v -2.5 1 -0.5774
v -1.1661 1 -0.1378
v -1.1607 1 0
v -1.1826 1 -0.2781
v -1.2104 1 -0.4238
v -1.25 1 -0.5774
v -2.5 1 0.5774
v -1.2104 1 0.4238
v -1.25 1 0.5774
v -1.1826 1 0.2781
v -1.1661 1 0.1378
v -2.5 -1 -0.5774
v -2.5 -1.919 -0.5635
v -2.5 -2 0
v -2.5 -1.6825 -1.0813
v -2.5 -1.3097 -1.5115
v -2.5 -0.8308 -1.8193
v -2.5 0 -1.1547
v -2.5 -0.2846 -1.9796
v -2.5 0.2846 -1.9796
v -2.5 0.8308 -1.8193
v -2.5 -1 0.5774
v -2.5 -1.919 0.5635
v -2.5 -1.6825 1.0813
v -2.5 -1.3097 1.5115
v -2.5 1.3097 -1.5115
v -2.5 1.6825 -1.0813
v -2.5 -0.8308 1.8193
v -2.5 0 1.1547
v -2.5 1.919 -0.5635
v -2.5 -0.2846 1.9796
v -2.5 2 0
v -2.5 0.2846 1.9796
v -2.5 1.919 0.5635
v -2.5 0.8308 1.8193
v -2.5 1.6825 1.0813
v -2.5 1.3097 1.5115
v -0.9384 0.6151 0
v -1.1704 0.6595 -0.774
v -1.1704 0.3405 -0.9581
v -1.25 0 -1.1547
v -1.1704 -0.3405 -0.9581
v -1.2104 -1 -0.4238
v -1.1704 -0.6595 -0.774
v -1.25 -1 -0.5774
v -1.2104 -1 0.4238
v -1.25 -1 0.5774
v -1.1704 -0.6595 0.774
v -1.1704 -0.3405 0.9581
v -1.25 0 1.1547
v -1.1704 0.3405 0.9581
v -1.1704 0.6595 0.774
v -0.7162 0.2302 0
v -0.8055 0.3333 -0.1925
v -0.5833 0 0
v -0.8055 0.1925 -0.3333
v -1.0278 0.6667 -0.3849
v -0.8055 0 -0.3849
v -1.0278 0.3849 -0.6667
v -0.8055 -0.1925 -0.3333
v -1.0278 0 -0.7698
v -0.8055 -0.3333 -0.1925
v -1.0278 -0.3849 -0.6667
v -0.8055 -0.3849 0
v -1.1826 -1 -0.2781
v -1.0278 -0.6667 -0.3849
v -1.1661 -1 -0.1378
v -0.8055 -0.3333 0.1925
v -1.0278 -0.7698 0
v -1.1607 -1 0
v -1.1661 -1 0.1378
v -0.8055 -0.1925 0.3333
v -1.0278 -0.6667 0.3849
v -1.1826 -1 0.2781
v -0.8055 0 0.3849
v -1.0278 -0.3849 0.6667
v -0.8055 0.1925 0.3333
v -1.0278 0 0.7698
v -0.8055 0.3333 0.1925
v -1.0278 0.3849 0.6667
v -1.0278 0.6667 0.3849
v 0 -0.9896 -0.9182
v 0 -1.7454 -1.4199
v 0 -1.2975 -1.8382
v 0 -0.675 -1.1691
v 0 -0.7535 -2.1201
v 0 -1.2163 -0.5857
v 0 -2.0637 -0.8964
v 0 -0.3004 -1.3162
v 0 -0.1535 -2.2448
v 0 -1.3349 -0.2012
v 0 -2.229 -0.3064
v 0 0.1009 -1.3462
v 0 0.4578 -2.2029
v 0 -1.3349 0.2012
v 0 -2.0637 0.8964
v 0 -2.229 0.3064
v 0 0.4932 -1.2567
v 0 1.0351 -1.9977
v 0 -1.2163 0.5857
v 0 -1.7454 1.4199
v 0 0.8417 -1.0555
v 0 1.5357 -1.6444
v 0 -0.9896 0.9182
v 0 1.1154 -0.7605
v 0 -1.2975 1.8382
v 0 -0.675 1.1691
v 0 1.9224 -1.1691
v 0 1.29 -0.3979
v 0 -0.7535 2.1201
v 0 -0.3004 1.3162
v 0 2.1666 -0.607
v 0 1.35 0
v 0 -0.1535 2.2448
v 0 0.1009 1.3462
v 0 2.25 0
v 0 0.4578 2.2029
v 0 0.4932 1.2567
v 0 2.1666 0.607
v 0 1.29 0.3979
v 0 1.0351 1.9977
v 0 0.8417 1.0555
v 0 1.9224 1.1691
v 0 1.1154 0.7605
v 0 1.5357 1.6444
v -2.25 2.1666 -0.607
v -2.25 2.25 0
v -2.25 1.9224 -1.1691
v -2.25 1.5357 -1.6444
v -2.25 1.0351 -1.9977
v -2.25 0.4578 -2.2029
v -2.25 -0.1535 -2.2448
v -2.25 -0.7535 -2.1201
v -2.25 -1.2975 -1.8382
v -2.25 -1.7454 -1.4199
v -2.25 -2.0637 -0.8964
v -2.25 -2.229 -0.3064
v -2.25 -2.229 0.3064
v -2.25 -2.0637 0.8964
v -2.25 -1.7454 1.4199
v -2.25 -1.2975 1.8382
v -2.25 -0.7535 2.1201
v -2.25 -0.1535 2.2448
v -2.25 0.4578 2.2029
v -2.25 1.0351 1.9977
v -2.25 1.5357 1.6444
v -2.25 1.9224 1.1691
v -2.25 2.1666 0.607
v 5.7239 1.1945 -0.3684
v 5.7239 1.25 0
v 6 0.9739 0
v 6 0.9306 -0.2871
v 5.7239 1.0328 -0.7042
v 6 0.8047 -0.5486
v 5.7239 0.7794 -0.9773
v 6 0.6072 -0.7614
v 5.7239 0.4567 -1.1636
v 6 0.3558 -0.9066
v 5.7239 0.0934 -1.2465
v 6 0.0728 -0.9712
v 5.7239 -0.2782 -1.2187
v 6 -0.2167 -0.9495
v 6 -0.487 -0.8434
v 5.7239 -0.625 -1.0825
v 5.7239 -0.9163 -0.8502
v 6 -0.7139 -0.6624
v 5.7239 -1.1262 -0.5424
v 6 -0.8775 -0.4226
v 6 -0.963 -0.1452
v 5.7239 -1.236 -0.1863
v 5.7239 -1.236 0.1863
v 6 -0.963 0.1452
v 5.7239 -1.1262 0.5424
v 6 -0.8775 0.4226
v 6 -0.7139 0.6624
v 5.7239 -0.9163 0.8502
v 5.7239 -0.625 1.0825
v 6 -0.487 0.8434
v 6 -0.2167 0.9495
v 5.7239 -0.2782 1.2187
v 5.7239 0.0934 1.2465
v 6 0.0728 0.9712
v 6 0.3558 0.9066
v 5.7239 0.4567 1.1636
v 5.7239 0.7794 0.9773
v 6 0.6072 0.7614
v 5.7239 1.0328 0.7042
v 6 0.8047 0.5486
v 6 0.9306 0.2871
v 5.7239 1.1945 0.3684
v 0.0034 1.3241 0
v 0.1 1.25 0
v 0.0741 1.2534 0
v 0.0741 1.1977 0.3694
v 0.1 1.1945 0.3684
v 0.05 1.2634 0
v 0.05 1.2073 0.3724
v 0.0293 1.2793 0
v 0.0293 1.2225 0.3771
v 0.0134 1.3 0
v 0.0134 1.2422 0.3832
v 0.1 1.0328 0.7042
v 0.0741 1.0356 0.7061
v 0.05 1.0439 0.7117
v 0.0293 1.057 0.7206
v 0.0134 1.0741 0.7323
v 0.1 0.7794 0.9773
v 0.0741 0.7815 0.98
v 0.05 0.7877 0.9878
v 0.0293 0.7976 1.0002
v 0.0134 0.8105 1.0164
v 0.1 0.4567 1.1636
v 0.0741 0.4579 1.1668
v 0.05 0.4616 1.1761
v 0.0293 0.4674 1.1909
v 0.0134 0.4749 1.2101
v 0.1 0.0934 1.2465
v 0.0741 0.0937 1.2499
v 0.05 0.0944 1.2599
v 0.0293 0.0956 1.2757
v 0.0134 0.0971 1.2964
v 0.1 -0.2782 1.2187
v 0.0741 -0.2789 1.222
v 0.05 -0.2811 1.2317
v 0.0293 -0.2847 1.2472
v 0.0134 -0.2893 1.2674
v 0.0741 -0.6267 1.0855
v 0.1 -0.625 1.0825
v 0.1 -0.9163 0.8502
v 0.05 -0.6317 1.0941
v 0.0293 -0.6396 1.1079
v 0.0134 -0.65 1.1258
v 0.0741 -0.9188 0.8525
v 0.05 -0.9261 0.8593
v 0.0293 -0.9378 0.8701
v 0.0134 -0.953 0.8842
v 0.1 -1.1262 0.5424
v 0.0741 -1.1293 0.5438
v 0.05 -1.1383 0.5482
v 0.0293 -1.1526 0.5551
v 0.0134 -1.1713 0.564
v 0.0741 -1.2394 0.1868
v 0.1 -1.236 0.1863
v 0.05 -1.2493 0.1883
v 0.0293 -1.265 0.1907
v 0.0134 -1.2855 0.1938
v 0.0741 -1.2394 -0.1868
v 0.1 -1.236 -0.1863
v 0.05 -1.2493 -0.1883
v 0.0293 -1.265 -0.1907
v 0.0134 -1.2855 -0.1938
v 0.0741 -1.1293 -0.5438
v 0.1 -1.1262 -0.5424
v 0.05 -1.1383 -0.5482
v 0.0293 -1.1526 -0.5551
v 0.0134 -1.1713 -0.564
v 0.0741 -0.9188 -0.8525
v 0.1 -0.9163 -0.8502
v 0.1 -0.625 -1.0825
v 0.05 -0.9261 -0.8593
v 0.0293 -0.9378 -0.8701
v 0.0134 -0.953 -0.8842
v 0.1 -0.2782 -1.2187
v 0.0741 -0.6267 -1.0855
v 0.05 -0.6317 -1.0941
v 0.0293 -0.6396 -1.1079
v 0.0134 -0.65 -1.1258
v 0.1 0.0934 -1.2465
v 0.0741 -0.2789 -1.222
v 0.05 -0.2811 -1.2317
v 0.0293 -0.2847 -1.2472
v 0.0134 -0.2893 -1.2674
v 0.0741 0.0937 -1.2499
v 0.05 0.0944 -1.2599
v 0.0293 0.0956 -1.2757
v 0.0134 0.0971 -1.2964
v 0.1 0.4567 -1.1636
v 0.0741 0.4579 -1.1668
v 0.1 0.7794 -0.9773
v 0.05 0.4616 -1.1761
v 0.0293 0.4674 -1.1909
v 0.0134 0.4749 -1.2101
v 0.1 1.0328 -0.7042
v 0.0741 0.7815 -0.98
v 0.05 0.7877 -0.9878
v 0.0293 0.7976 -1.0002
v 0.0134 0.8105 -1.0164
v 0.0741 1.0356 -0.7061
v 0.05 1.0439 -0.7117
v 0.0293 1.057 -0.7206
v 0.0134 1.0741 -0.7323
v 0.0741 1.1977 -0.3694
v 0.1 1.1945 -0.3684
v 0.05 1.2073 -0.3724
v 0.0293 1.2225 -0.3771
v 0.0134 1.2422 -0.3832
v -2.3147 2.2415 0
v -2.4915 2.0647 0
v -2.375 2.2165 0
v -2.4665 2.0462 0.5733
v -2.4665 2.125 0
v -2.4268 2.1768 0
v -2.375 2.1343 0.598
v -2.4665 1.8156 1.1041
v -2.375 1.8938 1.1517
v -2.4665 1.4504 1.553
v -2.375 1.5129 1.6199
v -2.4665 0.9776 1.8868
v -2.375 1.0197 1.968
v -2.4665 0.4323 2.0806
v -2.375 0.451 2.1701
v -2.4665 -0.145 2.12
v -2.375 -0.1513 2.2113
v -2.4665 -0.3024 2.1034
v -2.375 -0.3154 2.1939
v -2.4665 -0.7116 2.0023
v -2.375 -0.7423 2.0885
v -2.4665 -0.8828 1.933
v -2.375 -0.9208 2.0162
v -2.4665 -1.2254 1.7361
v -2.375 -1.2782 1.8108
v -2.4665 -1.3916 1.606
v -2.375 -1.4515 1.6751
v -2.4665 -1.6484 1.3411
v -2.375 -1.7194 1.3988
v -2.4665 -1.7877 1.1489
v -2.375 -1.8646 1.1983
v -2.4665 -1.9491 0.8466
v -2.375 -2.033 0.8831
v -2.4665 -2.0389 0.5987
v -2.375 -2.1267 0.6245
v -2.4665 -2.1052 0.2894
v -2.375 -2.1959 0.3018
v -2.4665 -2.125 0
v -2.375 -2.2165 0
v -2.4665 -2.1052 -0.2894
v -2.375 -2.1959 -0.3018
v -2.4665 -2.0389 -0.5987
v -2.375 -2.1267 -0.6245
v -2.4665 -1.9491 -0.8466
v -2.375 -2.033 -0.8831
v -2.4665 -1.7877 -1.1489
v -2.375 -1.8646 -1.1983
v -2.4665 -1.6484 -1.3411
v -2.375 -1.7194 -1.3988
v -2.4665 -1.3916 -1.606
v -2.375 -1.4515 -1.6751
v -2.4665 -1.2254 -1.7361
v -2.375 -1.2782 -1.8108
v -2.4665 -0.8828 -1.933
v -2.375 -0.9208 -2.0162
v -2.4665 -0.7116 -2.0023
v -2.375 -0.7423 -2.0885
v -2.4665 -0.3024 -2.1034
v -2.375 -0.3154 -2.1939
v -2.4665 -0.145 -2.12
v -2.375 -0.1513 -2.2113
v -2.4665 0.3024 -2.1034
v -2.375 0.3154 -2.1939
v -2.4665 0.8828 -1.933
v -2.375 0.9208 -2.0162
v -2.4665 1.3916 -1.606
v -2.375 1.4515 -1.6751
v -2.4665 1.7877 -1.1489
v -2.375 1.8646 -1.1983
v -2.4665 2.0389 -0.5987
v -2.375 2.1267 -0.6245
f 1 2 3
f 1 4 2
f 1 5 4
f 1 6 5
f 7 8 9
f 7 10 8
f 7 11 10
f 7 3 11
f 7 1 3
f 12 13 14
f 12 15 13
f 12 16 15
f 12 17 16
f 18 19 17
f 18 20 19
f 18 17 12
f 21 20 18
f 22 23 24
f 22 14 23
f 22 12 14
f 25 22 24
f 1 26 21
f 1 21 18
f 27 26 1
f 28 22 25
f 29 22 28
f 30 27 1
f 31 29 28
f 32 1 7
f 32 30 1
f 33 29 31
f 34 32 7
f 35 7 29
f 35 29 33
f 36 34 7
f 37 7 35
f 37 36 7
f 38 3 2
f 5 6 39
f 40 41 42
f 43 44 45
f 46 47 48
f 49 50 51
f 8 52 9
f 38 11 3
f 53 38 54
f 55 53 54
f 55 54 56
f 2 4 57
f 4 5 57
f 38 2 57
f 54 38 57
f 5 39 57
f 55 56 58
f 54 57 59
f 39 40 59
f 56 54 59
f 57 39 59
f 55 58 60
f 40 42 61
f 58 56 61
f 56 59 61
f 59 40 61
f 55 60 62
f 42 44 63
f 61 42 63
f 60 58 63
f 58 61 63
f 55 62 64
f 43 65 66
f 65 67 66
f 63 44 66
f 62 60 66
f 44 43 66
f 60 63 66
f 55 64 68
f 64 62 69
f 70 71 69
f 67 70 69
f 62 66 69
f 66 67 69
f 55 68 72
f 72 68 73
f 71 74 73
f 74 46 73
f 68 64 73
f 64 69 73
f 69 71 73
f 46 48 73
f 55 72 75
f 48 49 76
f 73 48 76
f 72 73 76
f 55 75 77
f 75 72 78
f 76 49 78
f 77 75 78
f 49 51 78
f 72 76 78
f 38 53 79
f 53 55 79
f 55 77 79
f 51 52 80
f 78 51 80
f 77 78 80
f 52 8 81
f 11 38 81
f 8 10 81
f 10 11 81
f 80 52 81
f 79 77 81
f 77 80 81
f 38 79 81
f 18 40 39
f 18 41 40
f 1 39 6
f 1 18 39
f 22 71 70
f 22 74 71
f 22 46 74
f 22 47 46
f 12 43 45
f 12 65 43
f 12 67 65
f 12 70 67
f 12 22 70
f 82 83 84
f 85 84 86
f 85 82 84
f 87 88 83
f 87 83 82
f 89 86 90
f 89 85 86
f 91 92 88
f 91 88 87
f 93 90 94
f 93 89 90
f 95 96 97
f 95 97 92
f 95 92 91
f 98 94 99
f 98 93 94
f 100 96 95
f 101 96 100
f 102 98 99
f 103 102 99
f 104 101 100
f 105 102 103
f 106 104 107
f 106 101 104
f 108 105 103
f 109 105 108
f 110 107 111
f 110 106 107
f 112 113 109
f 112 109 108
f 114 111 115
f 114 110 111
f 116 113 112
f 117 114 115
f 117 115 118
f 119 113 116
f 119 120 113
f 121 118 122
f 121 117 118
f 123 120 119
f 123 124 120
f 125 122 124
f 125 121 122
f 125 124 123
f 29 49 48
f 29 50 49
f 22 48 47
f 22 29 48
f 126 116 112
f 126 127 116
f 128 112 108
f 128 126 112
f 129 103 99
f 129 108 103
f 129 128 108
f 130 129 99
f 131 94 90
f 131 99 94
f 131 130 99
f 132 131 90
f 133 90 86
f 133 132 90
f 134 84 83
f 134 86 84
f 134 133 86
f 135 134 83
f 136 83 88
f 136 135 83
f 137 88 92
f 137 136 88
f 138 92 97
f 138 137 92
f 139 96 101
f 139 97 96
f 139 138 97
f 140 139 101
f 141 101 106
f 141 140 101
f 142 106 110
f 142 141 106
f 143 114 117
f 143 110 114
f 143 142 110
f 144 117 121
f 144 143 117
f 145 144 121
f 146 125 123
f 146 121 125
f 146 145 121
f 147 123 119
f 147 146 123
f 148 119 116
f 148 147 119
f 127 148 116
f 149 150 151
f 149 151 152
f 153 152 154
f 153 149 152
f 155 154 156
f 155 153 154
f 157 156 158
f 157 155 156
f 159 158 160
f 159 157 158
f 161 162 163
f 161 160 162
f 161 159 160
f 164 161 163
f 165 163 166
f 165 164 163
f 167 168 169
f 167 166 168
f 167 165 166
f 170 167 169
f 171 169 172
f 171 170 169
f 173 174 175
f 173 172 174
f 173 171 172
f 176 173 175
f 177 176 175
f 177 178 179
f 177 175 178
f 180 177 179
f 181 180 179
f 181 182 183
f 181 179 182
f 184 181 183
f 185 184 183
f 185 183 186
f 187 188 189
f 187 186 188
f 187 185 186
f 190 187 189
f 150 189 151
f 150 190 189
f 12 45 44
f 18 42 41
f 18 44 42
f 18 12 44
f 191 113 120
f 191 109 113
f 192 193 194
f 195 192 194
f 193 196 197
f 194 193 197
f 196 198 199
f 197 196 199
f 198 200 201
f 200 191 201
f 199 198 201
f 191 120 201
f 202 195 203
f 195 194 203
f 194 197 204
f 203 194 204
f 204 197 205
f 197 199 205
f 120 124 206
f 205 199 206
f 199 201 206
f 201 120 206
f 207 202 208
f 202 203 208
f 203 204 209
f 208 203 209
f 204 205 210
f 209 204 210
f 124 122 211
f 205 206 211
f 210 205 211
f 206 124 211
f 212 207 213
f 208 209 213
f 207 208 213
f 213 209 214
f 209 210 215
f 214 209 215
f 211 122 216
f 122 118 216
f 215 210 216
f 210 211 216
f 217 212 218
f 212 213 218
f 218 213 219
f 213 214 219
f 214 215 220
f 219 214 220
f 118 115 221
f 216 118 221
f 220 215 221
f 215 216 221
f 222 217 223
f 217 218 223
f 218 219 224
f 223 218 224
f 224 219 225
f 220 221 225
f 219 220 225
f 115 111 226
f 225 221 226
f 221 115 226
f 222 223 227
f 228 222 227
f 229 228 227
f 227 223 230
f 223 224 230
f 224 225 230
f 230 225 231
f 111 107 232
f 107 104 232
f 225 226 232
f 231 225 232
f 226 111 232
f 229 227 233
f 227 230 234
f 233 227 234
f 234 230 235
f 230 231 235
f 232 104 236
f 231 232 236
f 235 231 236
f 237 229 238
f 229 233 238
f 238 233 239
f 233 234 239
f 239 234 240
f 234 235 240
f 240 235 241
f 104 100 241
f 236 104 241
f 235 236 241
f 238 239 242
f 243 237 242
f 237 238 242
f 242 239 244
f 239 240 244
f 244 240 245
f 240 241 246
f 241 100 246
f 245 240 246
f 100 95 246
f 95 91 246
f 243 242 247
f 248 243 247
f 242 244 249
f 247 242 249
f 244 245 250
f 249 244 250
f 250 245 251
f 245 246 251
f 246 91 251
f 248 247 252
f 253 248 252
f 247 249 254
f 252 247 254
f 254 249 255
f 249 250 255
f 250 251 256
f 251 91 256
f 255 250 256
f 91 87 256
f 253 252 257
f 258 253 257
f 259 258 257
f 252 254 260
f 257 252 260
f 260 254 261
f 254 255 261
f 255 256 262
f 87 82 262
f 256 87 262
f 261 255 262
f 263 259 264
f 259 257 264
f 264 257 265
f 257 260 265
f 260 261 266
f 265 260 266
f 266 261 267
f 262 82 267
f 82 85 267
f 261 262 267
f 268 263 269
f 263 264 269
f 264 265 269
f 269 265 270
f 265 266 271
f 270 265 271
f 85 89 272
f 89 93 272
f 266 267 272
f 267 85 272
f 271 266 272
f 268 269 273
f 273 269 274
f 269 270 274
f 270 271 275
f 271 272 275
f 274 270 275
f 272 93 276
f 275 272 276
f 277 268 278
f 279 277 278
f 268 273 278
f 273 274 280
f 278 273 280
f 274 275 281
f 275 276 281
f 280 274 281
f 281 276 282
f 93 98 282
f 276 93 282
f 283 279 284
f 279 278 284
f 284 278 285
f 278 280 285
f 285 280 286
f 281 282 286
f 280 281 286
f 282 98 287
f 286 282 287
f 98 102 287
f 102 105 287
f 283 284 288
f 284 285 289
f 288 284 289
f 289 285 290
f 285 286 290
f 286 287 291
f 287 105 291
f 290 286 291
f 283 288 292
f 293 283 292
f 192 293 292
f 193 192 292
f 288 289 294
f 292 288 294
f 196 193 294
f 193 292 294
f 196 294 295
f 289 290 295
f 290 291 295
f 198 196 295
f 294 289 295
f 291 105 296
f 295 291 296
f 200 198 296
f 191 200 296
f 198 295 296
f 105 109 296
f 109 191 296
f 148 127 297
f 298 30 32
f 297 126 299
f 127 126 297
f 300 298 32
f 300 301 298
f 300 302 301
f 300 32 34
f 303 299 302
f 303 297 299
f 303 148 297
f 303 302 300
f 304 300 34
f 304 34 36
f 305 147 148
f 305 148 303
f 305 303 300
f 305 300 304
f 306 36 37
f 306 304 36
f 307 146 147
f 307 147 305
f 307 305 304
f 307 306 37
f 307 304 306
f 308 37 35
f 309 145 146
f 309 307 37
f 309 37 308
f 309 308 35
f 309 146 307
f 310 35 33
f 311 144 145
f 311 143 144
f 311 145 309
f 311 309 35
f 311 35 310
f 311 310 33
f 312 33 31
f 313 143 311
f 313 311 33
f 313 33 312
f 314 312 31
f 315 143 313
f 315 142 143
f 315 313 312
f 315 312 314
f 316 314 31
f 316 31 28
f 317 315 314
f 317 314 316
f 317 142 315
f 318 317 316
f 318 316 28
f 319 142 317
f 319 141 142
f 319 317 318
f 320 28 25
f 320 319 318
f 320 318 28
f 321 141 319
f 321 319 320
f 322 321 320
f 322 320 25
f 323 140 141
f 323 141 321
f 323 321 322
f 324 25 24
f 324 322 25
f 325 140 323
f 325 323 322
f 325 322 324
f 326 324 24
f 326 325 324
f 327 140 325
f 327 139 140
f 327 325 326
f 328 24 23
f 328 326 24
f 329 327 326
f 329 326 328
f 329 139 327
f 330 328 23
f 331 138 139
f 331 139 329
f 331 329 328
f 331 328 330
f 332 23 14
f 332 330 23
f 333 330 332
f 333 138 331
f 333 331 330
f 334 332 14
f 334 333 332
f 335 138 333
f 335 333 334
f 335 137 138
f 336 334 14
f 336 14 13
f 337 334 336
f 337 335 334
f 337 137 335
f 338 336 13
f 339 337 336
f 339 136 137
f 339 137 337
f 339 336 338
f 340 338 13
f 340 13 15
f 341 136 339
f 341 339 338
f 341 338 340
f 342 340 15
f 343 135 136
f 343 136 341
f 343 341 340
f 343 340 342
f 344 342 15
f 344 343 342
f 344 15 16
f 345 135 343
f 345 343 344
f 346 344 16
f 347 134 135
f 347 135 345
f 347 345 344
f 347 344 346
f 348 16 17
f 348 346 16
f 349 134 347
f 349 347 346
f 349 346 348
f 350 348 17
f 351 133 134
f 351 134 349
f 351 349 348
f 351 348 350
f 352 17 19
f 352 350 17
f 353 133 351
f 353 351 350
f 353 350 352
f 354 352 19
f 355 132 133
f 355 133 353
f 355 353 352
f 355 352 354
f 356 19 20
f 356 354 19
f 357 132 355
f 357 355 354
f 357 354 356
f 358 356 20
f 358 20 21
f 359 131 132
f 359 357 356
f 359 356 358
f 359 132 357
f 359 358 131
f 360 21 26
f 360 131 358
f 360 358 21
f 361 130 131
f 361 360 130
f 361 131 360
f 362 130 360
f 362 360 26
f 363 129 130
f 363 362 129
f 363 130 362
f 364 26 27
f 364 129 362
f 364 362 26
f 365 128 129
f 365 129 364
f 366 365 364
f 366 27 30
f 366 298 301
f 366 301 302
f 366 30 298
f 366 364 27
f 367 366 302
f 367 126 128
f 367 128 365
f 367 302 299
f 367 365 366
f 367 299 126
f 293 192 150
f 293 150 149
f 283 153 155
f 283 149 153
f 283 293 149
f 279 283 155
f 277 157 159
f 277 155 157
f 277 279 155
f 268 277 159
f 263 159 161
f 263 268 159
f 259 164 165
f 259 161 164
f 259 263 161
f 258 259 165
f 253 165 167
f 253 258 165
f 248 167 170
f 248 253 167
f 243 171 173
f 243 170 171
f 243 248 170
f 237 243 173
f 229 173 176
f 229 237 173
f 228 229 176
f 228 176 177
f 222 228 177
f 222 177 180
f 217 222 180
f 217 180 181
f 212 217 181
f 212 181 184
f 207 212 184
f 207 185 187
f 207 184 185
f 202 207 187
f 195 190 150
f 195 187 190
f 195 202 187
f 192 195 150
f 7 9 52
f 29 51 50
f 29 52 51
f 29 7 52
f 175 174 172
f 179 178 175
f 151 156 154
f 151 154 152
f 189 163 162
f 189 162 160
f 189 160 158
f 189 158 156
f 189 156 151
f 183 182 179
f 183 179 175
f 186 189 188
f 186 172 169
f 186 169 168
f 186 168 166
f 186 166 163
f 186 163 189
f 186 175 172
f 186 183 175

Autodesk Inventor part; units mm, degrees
ref_plane "YZ Plane" through (0, 0, 0) normal (1, 0, 0) x (0, 1, 0)
ref_plane "XZ Plane" through (0, 0, 0) normal (0, 1, 0) x (-1, 0, 0)
sketch "Sketch1" plane through (0, 0, 0) normal (0, 0, 1) x (1, 0, 0)
  line L0 (-0.5833, 0) -> (6, 0)
  line L1 (6, 0) -> (6, 1.25)
  line L2 (6, 1.25) -> (1.1761, 1.25)
  line L3 (1.1761, 1.25) -> (0.8999, 1.25)
  line L4 (0.8999, 1.25) -> (0, 1.25)
  line L5 (0, 1.25) -> (0, 2.25)
  line L6 (0, 2.25) -> (-2.5, 2.25)
  line L7 (-2.5, 2.25) -> (-2.5, 1.1547)
  line L8 (-2.5, 1.1547) -> (-1.25, 1.1547)
  line L9 (-1.25, 1.1547) -> (-0.5833, 0)
  line L10 (-4.2, 0) -> (7.7, 0) projected
  line L11 (0, -0.45) -> (0, 2.7) projected
  line L12 (1.1761, 1.25) -> (0, 1.25) construction
  dimension "d1" = 4.8239
  dimension "d2" = 0.2762
  dimension "d3" = 2.5
  dimension "d4" = 1.25
  dimension "d5" = 60
  dimension "d6" = 2.5
  dimension "d7" = 2.5
  dimension "d8" = 2.3094
  dimension "d9" = 4.5
  dimension "d26" = 6
revolve "Body" add sketch "Sketch1" angle 360 about axis through (-0.5833, 0, 0) along (1, 0, 0)
sketch "Sketch2" plane through (-2.5, 0, 0) normal (-1, 0, 0) x (0, 0, 1)
  circle A0 centre (0, 0) radius 1.1547 projected
  line L0 (0, -3.15) -> (0, 3.15) projected
  line L1 (-3.15, 0) -> (3.15, 0) projected
  line L2 (1.1547, 0) -> (0.5774, -1)
  line L3 (0.5774, -1) -> (-0.5774, -1)
  line L4 (-0.5774, -1) -> (-1.1547, 0)
  line L5 (-1.1547, 0) -> (-0.5774, 1)
  line L6 (-0.5774, 1) -> (0.5774, 1)
  line L7 (0.5774, 1) -> (1.1547, 0)
extrude "Slot" add sketch "Sketch2" against normal up to next contours L7 A0 | A0 L2 | L6 L0 A0 | A0 L0 L3 | L0 L6 A0 | A0 L3 L0 | L4 A0 | A0 L5
fillet "Fillet1" radius 0.25 1 edges at (-2.5, -2.25, 0)
thread "Thread" size "M2.5x0.45" class "6g" standard "ISO Metric profile" length 4.8239
chamfer "Chamfer1" distance 0.2761 distance2 0.2761 1 edges at (6, -1.25, 0) measured on face at (6, -0.1825, -0.5629)
ref_plane "Work Plane1" through (29, 0, 0) normal (0, -1, 0) x (1, 0, 0)
fillet "Fillet2" radius 0.1 1 edges at (0, -1.25, 0)
equation "\"d30\" = R"
equation "\"d17\" = RR"
equation "\"d13\" = GEL"
equation "\"d15\" = -0.5 * SPD + 0.5 * GD"
equation "\"d16\" = GUL"
equation "\"d1\" = GEL"
equation "\"d3\" = KOH"
equation "\"d4\" = INTI"
equation "\"d6\" = GD"
equation "\"d7\" = BDM"
equation "\"d8\" = 1.1547 * SW"
equation "\"d9\" = KOD"
equation "\"d26\" = NLG"
equation "\"GD\" = NND"
equation "\"NLG\" = 6"
equation "\"GEL\" = 4.82395"
equation "\"KOD\" = 4.5"
equation "\"KOH\" = 2.5"
equation "\"INTI\" = 1.25"
equation "\"GAL\" = 0.61345 * PTC"
equation "\"GUL\" = 0.61345 * PTC"
equation "\"BDM\" = NND"
equation "\"SW\" = 2"
equation "\"RR\" = 0.25"
equation "\"SPD\" = 1.94789"
equation "\"R\" = 0.1"
equation "\"TOA\" = 30deg"
equation "\"THREADDIA\" = 2.5"
equation "\"PTC\" = 0.45"
equation "\"NND\" = 2.5"
equation "\"E0\" = 1.155 * SW"
equation "\"GD1\" = THREADDIA - 1.2269 * PTC"
properties part number "ANSI B18.3.1M - M2.5x0.45 x 6" material "Steel, Mild"
